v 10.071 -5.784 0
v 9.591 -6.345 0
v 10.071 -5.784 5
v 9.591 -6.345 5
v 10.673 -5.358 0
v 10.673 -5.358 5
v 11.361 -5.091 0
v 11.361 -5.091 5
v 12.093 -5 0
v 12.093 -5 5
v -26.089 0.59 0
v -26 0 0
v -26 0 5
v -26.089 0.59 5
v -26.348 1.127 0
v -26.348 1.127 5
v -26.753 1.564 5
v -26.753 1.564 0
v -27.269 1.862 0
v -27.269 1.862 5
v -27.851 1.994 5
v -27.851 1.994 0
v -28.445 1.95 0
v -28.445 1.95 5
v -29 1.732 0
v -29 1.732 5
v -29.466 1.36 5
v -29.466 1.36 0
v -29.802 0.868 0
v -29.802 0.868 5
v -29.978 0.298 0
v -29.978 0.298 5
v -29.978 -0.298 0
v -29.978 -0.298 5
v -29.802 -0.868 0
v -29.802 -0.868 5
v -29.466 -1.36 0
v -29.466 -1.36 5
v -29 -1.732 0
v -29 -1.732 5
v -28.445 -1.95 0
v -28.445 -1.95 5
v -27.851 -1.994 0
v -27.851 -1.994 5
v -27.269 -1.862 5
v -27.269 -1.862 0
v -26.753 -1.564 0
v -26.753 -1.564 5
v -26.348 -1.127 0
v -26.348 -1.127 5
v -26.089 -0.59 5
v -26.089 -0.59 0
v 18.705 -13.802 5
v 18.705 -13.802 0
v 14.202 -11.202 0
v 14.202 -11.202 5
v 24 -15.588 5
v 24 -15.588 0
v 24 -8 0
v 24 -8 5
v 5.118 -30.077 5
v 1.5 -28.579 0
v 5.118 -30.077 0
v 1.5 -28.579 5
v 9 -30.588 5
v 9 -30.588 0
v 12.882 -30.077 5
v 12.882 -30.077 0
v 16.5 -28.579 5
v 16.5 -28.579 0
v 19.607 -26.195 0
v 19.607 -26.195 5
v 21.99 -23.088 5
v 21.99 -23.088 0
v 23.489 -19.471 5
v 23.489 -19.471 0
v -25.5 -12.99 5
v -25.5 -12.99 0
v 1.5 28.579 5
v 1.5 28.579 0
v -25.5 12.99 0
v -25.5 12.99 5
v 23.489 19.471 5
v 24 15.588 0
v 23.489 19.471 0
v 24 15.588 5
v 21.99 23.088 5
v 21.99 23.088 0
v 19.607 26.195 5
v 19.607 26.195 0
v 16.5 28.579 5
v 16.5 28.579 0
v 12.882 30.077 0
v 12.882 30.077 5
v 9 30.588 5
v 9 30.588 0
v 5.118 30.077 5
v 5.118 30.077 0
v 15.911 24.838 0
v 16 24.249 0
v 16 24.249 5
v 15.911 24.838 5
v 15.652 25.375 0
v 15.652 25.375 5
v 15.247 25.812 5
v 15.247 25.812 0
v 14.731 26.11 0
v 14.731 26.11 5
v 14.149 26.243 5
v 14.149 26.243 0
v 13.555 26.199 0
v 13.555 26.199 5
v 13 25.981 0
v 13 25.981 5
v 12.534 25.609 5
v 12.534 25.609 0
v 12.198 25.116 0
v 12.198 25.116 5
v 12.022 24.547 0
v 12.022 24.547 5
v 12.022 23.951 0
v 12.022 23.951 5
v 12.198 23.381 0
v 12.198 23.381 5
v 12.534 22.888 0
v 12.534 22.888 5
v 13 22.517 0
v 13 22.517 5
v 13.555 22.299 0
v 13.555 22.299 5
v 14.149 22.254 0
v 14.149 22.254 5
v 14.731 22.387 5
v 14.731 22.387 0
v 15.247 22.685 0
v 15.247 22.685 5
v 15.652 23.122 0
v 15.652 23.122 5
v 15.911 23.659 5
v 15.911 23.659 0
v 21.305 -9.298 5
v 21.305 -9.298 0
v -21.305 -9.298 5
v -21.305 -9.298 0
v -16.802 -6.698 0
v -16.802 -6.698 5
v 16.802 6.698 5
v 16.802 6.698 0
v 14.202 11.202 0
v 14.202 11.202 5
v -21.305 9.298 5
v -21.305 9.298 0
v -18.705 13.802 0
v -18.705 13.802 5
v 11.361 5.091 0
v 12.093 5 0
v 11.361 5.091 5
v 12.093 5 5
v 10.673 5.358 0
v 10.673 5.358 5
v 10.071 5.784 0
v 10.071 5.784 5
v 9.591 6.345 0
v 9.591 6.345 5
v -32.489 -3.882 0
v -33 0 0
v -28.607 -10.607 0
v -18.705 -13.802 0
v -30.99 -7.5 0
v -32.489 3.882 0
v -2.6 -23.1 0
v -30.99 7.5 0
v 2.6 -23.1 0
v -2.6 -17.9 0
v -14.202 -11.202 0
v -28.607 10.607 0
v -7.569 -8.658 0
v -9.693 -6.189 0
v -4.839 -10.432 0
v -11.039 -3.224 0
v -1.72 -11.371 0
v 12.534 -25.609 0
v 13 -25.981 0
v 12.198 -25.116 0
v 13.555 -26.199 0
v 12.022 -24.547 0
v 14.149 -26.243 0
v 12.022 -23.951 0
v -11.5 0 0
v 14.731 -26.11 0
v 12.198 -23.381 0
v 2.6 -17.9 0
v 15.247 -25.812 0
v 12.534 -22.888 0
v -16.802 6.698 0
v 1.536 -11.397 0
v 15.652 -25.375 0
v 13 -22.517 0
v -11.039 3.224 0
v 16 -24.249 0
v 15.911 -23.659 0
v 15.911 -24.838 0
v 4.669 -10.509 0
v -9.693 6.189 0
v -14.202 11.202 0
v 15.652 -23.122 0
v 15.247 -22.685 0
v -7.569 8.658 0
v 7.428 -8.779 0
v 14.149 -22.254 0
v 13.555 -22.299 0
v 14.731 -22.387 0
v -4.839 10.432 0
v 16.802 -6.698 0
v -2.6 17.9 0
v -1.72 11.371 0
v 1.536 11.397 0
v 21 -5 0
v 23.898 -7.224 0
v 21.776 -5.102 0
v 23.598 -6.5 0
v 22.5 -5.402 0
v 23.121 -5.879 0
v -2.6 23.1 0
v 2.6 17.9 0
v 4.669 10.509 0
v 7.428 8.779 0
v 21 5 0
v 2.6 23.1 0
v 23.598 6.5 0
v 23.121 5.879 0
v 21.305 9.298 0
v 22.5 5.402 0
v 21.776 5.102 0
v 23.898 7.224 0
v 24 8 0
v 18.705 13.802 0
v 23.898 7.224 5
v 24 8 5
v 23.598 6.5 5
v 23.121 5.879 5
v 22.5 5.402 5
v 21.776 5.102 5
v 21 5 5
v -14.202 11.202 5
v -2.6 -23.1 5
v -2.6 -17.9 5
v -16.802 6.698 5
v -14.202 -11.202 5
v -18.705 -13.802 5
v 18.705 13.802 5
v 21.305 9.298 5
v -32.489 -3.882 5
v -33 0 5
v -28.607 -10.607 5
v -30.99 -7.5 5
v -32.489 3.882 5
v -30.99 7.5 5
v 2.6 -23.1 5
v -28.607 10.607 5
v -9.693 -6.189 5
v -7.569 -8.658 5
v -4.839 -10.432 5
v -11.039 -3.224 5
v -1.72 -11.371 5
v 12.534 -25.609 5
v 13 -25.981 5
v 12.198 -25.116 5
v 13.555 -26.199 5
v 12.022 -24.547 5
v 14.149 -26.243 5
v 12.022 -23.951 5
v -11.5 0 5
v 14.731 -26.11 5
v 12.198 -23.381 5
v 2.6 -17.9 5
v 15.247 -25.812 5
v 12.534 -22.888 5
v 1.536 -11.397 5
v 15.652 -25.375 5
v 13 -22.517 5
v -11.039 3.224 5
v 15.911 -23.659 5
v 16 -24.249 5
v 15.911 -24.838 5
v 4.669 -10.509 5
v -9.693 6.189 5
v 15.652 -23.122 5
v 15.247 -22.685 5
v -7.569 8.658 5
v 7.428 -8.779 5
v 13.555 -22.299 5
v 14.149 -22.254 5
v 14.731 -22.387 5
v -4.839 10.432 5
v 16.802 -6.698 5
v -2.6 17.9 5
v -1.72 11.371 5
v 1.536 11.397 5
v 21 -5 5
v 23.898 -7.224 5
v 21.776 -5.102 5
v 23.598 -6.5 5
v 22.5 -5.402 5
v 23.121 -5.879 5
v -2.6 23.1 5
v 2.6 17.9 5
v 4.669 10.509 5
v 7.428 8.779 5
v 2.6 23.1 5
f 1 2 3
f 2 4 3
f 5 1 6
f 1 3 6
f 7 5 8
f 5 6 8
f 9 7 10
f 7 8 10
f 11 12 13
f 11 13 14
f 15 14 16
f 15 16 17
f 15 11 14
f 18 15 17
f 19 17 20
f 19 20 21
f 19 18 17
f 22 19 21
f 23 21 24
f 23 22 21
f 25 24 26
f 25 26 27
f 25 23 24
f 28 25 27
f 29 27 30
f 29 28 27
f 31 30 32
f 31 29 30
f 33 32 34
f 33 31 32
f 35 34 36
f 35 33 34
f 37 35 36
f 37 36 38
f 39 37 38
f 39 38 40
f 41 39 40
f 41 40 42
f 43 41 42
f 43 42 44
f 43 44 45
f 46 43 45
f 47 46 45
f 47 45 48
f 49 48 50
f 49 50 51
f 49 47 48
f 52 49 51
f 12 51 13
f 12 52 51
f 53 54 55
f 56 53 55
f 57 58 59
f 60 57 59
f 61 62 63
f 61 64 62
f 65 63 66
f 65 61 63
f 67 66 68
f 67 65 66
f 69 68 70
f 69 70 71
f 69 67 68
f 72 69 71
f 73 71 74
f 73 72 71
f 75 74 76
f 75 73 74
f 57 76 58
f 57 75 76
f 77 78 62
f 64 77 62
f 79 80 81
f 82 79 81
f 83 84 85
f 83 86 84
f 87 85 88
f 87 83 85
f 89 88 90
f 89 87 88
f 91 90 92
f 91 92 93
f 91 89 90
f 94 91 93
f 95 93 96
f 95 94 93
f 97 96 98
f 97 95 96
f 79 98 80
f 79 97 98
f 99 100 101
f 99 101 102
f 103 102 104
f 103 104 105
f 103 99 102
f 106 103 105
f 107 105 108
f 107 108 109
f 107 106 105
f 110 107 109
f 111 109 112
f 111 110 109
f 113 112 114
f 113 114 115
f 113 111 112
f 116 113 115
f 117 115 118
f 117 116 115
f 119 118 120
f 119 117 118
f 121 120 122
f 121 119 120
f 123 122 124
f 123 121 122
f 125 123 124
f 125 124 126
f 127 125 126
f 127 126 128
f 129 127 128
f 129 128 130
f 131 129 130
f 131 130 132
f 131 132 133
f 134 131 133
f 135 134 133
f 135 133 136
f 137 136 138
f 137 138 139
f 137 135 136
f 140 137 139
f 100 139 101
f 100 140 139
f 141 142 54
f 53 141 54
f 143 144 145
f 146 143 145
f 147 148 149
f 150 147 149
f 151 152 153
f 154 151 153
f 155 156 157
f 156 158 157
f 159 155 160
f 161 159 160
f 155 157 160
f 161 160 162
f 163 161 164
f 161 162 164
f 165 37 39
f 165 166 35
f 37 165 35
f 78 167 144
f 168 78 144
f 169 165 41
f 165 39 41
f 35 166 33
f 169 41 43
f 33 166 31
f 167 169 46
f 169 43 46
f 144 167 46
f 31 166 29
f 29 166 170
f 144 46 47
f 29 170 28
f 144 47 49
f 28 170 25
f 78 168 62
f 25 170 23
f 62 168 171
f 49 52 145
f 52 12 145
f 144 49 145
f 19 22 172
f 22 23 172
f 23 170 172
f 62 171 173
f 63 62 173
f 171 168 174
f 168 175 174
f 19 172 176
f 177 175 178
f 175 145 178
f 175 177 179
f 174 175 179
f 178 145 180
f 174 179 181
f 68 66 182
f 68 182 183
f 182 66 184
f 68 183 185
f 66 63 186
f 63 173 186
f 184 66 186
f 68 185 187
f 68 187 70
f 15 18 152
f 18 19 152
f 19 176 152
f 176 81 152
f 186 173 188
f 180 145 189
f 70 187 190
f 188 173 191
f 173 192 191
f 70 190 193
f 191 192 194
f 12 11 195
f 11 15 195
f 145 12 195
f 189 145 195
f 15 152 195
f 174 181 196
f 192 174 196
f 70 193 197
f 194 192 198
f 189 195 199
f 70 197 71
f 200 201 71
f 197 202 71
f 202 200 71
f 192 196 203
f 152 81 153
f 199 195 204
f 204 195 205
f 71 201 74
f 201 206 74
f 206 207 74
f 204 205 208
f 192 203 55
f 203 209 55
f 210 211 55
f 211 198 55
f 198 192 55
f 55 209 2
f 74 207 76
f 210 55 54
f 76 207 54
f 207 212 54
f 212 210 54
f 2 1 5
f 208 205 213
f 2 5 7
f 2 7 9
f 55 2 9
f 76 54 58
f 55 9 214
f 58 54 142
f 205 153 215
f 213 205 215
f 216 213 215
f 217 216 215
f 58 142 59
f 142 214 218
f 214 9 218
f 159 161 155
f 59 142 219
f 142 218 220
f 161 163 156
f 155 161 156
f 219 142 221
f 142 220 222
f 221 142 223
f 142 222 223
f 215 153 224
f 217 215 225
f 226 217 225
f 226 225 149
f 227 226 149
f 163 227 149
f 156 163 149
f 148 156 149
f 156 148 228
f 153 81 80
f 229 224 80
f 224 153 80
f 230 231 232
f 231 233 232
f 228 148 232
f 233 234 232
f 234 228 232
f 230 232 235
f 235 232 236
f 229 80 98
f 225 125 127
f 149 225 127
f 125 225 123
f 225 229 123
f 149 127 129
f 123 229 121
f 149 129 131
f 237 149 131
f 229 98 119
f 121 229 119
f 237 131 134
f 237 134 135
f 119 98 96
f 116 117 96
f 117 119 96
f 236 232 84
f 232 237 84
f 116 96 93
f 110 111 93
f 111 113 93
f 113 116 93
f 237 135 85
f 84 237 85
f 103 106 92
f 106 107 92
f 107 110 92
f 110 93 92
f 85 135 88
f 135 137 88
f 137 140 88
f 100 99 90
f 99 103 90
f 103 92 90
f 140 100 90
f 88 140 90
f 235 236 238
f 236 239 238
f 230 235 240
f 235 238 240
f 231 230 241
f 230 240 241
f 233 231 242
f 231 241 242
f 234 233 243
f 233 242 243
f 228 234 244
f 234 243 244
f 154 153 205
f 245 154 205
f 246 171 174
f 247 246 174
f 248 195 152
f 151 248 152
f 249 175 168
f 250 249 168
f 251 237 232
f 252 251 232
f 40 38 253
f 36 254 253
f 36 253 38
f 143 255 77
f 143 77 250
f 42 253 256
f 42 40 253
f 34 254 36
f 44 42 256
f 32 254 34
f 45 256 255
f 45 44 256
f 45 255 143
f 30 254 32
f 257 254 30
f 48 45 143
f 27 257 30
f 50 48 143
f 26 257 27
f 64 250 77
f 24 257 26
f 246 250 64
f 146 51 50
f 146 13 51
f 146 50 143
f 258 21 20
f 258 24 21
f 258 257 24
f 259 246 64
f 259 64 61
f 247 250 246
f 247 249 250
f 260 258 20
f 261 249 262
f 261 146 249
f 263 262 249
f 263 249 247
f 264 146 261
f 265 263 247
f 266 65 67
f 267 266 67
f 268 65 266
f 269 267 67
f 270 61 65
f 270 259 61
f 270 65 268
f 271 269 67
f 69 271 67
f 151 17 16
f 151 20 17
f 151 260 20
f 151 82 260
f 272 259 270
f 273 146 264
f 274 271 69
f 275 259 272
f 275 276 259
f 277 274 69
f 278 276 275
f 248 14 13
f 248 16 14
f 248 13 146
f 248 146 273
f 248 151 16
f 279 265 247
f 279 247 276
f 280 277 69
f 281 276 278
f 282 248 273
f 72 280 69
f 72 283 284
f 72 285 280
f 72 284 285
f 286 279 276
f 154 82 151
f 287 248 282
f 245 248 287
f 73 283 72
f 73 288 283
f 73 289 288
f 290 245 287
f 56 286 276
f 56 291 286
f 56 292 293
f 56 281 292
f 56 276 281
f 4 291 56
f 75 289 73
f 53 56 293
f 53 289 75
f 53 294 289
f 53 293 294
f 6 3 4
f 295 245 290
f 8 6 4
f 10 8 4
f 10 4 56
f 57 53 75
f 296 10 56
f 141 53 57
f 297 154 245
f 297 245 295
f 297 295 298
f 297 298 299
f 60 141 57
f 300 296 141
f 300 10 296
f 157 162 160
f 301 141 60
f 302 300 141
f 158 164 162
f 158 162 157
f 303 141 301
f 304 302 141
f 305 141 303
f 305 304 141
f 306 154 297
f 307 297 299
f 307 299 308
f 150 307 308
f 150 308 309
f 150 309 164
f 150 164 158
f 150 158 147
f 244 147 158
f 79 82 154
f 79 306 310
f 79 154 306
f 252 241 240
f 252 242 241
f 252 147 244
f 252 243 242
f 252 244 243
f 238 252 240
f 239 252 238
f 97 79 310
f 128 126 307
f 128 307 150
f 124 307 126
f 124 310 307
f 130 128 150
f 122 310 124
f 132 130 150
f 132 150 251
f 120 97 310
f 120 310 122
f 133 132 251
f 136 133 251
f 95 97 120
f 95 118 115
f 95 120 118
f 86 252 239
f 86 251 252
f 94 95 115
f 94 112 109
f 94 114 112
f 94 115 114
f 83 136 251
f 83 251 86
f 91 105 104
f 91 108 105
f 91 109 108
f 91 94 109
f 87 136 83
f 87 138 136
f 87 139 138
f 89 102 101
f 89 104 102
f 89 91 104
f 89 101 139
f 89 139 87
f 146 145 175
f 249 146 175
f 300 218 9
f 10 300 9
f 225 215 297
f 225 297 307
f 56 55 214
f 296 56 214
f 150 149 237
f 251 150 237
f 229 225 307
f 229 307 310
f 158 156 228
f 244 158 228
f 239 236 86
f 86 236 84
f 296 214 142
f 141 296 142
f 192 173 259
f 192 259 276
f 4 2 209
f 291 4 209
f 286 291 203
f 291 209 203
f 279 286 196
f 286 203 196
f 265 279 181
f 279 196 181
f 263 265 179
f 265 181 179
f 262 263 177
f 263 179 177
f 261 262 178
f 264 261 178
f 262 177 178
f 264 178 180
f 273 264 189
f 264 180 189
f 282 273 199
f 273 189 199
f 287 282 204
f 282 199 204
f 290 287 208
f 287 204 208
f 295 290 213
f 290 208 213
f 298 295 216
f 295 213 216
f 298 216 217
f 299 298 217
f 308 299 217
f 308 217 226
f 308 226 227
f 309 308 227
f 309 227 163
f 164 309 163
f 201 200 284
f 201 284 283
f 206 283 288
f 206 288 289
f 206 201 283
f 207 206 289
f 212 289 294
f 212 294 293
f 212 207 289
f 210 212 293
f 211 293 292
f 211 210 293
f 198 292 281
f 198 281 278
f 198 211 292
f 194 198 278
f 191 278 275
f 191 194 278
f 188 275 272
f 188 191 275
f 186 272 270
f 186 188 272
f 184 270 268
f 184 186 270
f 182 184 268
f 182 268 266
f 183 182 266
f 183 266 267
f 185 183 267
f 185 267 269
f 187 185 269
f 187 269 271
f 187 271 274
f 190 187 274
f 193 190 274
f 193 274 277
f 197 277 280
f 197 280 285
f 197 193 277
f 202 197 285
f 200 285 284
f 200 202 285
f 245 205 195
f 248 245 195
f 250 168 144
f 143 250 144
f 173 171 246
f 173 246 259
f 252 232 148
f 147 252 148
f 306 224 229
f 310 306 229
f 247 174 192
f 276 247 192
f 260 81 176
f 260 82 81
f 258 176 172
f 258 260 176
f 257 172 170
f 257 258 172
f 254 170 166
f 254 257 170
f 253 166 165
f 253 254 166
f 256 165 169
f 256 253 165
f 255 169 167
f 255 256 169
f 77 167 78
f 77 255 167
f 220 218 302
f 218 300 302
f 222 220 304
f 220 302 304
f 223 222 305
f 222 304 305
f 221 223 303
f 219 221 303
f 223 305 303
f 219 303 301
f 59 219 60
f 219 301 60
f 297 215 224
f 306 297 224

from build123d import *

# Parameters (mm, degrees)
SKETCH1_R           = 2
SKETCH1_W           = 5.2
SKETCH1_H           = 5.2
BOSS_EXTRUDE1_DEPTH = 5
CONG_1_R            = 15
CONG_2_R            = 3


with BuildPart() as part:
    # Sketch1 → Boss-Extrude1 (new body)
    with BuildSketch(Plane.XY):
        with BuildLine():
            Line((24, 5), (24, 41.569219382))
            Line((24, 41.569219382), (-48, 0))
            Line((-48, 0), (24, -41.569219382))
            Line((24, -41.569219382), (24, -5))
            Line((24, -5), (10.356157589, -5))
            ThreePointArc((10.356157589, -5), (-11.5, 0), (10.356157589, 5))
            Line((10.356157589, 5), (24, 5))
        make_face()
        with Locations((14, 24.248711306)):
            Circle(SKETCH1_R, mode=Mode.SUBTRACT)
        with Locations((14, -24.248711306)):
            Circle(SKETCH1_R, mode=Mode.SUBTRACT)
        with Locations((-28, 0)):
            Circle(SKETCH1_R, mode=Mode.SUBTRACT)
        with Locations((0, 20.5)):
            Rectangle(SKETCH1_W, SKETCH1_H, mode=Mode.SUBTRACT)
        Polygon((21.305186827, 9.29833395), (16.801854728, 6.69833395), (14.201854728, 11.20166605), (18.705186827, 13.80166605), align=None, mode=Mode.SUBTRACT)
        Polygon((18.705186827, -13.80166605), (14.201854728, -11.20166605), (16.801854728, -6.69833395), (21.305186827, -9.29833395), align=None, mode=Mode.SUBTRACT)
        with Locations((0, -20.5)):
            Rectangle(SKETCH1_W, SKETCH1_H, mode=Mode.SUBTRACT)
        Polygon((-21.305186827, -9.29833395), (-16.801854728, -6.69833395), (-14.201854728, -11.20166605), (-18.705186827, -13.80166605), align=None, mode=Mode.SUBTRACT)
        Polygon((-18.705186827, 13.80166605), (-14.201854728, 11.20166605), (-16.801854728, 6.69833395), (-21.305186827, 9.29833395), align=None, mode=Mode.SUBTRACT)
    extrude(amount=BOSS_EXTRUDE1_DEPTH)

    # Congé1
    cong_1_edges = [part.edges().sort_by_distance(p)[0] for p in [
        (24, -41.569219382, 2.5),
        (-48, 0, 2.5),
        (24, 41.569219382, 2.5),
    ]]
    fillet(cong_1_edges, radius=CONG_1_R)

    # Congé2
    cong_2_edges = [part.edges().sort_by_distance(p)[0] for p in [
        (10.356157589, 5, 2.5),
        (10.356157589, -5, 2.5),
        (24, -5, 2.5),
        (24, 5, 2.5),
    ]]
    fillet(cong_2_edges, radius=CONG_2_R)


solid = part.part
